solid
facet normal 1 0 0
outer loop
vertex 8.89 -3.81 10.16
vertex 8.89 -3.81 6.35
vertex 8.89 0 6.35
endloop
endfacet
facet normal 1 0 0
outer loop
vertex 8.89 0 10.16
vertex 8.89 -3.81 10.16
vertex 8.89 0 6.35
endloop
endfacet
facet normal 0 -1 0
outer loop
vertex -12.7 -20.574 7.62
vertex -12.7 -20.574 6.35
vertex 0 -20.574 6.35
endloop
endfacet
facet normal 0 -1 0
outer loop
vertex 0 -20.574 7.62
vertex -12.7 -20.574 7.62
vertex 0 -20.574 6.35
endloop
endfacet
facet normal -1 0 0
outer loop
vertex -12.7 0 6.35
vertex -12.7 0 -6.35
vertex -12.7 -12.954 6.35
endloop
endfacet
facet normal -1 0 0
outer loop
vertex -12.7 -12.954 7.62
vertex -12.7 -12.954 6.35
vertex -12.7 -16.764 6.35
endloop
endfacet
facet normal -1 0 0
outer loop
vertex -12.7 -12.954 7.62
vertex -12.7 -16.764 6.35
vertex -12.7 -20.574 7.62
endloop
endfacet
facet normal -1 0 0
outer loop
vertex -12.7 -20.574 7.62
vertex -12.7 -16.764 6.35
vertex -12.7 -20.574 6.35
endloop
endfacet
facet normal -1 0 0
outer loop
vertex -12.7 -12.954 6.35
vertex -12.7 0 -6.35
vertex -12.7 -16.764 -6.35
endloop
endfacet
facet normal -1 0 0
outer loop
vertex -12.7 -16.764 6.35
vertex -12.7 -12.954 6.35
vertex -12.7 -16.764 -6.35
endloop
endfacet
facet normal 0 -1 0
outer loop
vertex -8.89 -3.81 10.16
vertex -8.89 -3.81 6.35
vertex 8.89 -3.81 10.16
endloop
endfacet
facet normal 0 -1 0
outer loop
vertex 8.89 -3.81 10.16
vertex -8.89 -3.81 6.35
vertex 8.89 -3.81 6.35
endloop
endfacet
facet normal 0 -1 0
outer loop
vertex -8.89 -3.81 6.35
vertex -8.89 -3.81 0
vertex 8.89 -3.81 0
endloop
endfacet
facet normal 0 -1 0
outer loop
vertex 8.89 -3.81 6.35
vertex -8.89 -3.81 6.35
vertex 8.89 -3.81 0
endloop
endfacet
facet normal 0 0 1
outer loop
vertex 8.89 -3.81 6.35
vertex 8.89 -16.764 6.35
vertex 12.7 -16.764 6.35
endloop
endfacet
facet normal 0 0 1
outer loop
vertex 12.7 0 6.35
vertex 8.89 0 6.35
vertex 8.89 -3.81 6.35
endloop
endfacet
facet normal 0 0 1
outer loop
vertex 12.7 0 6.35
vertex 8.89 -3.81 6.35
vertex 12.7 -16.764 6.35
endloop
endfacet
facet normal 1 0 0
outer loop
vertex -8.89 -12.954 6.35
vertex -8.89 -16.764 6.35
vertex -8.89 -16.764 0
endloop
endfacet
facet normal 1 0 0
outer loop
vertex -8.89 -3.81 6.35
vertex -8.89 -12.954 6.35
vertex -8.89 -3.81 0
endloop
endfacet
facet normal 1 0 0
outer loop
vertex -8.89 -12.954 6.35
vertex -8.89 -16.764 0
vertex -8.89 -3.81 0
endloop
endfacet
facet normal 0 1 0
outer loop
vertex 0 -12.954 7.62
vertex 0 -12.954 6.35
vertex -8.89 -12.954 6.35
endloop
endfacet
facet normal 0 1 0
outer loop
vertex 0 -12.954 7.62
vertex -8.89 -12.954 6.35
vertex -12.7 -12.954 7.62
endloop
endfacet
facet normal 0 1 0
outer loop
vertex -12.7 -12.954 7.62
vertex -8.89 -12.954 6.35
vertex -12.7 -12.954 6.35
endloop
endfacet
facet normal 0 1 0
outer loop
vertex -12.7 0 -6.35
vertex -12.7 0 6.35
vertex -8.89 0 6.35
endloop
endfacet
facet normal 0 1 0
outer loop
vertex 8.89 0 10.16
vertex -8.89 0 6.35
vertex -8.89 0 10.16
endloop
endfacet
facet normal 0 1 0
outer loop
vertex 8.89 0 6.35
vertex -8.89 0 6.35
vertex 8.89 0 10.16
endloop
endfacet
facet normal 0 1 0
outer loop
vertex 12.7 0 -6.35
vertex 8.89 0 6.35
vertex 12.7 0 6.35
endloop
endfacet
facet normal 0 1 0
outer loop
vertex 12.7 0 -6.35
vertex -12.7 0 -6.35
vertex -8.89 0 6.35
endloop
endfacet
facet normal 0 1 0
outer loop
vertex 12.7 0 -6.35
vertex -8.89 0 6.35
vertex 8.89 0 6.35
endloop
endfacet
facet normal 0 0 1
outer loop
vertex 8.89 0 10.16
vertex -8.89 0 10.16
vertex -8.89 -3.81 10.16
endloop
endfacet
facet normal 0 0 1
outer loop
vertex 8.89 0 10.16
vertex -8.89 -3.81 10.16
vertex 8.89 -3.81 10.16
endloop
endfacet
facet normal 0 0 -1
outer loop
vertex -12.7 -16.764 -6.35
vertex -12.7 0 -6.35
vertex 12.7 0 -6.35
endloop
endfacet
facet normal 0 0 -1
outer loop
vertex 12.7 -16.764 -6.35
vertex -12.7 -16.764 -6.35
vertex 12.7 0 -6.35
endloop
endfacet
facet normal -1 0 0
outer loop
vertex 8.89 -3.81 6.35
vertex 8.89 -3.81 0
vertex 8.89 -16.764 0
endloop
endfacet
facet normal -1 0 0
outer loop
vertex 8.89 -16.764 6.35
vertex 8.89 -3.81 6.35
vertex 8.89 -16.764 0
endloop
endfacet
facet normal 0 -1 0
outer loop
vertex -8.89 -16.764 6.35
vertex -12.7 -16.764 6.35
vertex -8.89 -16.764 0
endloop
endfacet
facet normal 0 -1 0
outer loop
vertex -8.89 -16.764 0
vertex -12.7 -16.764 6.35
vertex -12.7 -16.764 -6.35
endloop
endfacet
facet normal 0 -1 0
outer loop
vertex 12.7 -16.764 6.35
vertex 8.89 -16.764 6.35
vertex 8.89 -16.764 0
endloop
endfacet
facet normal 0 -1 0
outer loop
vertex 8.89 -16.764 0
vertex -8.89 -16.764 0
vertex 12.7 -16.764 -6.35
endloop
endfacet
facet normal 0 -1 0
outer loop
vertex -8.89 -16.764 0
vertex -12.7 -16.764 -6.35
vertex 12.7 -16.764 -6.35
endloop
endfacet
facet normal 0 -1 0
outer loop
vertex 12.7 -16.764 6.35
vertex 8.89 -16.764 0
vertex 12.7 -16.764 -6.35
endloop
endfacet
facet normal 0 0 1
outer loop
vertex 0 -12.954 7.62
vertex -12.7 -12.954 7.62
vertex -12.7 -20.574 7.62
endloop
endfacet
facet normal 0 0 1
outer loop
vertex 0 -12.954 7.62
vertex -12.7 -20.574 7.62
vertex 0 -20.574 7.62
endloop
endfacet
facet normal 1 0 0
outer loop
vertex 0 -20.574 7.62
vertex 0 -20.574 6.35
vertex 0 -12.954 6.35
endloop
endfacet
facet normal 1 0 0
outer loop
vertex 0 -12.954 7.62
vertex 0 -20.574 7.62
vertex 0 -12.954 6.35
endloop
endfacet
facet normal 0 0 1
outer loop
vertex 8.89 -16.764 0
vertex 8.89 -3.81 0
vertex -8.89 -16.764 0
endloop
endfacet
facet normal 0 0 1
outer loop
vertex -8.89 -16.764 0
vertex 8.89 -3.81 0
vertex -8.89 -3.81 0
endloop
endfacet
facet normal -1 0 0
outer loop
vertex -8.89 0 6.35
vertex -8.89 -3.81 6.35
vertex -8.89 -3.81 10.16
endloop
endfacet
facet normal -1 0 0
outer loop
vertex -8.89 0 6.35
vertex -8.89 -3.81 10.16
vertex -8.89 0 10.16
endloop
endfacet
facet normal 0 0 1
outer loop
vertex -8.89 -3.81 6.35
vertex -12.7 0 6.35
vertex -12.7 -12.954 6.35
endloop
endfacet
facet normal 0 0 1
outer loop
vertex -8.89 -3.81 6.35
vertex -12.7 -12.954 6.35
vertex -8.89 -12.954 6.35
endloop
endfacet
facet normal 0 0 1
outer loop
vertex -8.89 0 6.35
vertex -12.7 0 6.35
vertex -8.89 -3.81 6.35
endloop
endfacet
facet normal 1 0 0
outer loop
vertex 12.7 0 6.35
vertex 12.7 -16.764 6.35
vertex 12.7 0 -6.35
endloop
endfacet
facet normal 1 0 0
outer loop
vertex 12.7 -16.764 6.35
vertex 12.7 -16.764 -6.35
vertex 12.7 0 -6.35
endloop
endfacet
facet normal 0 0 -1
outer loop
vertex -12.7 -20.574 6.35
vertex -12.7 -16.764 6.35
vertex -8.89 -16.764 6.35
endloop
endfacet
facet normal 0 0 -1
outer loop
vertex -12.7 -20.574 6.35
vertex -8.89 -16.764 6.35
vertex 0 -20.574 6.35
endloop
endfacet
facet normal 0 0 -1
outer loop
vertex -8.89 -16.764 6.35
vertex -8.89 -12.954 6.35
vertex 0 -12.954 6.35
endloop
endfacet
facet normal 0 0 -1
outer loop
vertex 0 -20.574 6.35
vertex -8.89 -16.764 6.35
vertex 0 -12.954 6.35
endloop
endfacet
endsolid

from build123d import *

# Parameters (mm, degrees)
F1_DEPTH = 16.764
F3_DEPTH = 6.35
F4_W     = 17.78
F4_H     = 3.81
F5_DEPTH = 3.81
F7_DEPTH = 1.27


with BuildPart() as f1:
    # F0 (on Front) → F1 (new body)
    with BuildSketch(Plane.XZ):
        Polygon((-12.7, -6.35), (0, -6.35), (12.7, -6.35), (12.7, 0), (-12.7, 0), align=None)
    extrude(amount=F1_DEPTH)

    # F2 (on face) → F3 (join)
    with BuildSketch(Plane.XY):
        Polygon((-12.7, 0), (-12.7, -16.764), (-8.89, -16.764), (-8.89, -3.81), (0, -3.81), (8.89, -3.81), (8.89, -16.764), (12.7, -16.764), (12.7, 0), align=None)
    extrude(amount=F3_DEPTH)

    # F4 (on face) → F5 (join)
    with BuildSketch(Plane.XY.offset(6.35)):
        with Locations((0, -1.905)):
            Rectangle(F4_W, F4_H)
    extrude(amount=F5_DEPTH)

    # F6 (on face) → F7 (join)
    with BuildSketch(Plane.XY.offset(6.35)):
        Polygon((-12.7, -12.954), (-12.7, -16.764), (-12.7, -20.574), (0, -20.574), (0, -12.954), align=None)
    extrude(amount=F7_DEPTH)


solid = f1.part
